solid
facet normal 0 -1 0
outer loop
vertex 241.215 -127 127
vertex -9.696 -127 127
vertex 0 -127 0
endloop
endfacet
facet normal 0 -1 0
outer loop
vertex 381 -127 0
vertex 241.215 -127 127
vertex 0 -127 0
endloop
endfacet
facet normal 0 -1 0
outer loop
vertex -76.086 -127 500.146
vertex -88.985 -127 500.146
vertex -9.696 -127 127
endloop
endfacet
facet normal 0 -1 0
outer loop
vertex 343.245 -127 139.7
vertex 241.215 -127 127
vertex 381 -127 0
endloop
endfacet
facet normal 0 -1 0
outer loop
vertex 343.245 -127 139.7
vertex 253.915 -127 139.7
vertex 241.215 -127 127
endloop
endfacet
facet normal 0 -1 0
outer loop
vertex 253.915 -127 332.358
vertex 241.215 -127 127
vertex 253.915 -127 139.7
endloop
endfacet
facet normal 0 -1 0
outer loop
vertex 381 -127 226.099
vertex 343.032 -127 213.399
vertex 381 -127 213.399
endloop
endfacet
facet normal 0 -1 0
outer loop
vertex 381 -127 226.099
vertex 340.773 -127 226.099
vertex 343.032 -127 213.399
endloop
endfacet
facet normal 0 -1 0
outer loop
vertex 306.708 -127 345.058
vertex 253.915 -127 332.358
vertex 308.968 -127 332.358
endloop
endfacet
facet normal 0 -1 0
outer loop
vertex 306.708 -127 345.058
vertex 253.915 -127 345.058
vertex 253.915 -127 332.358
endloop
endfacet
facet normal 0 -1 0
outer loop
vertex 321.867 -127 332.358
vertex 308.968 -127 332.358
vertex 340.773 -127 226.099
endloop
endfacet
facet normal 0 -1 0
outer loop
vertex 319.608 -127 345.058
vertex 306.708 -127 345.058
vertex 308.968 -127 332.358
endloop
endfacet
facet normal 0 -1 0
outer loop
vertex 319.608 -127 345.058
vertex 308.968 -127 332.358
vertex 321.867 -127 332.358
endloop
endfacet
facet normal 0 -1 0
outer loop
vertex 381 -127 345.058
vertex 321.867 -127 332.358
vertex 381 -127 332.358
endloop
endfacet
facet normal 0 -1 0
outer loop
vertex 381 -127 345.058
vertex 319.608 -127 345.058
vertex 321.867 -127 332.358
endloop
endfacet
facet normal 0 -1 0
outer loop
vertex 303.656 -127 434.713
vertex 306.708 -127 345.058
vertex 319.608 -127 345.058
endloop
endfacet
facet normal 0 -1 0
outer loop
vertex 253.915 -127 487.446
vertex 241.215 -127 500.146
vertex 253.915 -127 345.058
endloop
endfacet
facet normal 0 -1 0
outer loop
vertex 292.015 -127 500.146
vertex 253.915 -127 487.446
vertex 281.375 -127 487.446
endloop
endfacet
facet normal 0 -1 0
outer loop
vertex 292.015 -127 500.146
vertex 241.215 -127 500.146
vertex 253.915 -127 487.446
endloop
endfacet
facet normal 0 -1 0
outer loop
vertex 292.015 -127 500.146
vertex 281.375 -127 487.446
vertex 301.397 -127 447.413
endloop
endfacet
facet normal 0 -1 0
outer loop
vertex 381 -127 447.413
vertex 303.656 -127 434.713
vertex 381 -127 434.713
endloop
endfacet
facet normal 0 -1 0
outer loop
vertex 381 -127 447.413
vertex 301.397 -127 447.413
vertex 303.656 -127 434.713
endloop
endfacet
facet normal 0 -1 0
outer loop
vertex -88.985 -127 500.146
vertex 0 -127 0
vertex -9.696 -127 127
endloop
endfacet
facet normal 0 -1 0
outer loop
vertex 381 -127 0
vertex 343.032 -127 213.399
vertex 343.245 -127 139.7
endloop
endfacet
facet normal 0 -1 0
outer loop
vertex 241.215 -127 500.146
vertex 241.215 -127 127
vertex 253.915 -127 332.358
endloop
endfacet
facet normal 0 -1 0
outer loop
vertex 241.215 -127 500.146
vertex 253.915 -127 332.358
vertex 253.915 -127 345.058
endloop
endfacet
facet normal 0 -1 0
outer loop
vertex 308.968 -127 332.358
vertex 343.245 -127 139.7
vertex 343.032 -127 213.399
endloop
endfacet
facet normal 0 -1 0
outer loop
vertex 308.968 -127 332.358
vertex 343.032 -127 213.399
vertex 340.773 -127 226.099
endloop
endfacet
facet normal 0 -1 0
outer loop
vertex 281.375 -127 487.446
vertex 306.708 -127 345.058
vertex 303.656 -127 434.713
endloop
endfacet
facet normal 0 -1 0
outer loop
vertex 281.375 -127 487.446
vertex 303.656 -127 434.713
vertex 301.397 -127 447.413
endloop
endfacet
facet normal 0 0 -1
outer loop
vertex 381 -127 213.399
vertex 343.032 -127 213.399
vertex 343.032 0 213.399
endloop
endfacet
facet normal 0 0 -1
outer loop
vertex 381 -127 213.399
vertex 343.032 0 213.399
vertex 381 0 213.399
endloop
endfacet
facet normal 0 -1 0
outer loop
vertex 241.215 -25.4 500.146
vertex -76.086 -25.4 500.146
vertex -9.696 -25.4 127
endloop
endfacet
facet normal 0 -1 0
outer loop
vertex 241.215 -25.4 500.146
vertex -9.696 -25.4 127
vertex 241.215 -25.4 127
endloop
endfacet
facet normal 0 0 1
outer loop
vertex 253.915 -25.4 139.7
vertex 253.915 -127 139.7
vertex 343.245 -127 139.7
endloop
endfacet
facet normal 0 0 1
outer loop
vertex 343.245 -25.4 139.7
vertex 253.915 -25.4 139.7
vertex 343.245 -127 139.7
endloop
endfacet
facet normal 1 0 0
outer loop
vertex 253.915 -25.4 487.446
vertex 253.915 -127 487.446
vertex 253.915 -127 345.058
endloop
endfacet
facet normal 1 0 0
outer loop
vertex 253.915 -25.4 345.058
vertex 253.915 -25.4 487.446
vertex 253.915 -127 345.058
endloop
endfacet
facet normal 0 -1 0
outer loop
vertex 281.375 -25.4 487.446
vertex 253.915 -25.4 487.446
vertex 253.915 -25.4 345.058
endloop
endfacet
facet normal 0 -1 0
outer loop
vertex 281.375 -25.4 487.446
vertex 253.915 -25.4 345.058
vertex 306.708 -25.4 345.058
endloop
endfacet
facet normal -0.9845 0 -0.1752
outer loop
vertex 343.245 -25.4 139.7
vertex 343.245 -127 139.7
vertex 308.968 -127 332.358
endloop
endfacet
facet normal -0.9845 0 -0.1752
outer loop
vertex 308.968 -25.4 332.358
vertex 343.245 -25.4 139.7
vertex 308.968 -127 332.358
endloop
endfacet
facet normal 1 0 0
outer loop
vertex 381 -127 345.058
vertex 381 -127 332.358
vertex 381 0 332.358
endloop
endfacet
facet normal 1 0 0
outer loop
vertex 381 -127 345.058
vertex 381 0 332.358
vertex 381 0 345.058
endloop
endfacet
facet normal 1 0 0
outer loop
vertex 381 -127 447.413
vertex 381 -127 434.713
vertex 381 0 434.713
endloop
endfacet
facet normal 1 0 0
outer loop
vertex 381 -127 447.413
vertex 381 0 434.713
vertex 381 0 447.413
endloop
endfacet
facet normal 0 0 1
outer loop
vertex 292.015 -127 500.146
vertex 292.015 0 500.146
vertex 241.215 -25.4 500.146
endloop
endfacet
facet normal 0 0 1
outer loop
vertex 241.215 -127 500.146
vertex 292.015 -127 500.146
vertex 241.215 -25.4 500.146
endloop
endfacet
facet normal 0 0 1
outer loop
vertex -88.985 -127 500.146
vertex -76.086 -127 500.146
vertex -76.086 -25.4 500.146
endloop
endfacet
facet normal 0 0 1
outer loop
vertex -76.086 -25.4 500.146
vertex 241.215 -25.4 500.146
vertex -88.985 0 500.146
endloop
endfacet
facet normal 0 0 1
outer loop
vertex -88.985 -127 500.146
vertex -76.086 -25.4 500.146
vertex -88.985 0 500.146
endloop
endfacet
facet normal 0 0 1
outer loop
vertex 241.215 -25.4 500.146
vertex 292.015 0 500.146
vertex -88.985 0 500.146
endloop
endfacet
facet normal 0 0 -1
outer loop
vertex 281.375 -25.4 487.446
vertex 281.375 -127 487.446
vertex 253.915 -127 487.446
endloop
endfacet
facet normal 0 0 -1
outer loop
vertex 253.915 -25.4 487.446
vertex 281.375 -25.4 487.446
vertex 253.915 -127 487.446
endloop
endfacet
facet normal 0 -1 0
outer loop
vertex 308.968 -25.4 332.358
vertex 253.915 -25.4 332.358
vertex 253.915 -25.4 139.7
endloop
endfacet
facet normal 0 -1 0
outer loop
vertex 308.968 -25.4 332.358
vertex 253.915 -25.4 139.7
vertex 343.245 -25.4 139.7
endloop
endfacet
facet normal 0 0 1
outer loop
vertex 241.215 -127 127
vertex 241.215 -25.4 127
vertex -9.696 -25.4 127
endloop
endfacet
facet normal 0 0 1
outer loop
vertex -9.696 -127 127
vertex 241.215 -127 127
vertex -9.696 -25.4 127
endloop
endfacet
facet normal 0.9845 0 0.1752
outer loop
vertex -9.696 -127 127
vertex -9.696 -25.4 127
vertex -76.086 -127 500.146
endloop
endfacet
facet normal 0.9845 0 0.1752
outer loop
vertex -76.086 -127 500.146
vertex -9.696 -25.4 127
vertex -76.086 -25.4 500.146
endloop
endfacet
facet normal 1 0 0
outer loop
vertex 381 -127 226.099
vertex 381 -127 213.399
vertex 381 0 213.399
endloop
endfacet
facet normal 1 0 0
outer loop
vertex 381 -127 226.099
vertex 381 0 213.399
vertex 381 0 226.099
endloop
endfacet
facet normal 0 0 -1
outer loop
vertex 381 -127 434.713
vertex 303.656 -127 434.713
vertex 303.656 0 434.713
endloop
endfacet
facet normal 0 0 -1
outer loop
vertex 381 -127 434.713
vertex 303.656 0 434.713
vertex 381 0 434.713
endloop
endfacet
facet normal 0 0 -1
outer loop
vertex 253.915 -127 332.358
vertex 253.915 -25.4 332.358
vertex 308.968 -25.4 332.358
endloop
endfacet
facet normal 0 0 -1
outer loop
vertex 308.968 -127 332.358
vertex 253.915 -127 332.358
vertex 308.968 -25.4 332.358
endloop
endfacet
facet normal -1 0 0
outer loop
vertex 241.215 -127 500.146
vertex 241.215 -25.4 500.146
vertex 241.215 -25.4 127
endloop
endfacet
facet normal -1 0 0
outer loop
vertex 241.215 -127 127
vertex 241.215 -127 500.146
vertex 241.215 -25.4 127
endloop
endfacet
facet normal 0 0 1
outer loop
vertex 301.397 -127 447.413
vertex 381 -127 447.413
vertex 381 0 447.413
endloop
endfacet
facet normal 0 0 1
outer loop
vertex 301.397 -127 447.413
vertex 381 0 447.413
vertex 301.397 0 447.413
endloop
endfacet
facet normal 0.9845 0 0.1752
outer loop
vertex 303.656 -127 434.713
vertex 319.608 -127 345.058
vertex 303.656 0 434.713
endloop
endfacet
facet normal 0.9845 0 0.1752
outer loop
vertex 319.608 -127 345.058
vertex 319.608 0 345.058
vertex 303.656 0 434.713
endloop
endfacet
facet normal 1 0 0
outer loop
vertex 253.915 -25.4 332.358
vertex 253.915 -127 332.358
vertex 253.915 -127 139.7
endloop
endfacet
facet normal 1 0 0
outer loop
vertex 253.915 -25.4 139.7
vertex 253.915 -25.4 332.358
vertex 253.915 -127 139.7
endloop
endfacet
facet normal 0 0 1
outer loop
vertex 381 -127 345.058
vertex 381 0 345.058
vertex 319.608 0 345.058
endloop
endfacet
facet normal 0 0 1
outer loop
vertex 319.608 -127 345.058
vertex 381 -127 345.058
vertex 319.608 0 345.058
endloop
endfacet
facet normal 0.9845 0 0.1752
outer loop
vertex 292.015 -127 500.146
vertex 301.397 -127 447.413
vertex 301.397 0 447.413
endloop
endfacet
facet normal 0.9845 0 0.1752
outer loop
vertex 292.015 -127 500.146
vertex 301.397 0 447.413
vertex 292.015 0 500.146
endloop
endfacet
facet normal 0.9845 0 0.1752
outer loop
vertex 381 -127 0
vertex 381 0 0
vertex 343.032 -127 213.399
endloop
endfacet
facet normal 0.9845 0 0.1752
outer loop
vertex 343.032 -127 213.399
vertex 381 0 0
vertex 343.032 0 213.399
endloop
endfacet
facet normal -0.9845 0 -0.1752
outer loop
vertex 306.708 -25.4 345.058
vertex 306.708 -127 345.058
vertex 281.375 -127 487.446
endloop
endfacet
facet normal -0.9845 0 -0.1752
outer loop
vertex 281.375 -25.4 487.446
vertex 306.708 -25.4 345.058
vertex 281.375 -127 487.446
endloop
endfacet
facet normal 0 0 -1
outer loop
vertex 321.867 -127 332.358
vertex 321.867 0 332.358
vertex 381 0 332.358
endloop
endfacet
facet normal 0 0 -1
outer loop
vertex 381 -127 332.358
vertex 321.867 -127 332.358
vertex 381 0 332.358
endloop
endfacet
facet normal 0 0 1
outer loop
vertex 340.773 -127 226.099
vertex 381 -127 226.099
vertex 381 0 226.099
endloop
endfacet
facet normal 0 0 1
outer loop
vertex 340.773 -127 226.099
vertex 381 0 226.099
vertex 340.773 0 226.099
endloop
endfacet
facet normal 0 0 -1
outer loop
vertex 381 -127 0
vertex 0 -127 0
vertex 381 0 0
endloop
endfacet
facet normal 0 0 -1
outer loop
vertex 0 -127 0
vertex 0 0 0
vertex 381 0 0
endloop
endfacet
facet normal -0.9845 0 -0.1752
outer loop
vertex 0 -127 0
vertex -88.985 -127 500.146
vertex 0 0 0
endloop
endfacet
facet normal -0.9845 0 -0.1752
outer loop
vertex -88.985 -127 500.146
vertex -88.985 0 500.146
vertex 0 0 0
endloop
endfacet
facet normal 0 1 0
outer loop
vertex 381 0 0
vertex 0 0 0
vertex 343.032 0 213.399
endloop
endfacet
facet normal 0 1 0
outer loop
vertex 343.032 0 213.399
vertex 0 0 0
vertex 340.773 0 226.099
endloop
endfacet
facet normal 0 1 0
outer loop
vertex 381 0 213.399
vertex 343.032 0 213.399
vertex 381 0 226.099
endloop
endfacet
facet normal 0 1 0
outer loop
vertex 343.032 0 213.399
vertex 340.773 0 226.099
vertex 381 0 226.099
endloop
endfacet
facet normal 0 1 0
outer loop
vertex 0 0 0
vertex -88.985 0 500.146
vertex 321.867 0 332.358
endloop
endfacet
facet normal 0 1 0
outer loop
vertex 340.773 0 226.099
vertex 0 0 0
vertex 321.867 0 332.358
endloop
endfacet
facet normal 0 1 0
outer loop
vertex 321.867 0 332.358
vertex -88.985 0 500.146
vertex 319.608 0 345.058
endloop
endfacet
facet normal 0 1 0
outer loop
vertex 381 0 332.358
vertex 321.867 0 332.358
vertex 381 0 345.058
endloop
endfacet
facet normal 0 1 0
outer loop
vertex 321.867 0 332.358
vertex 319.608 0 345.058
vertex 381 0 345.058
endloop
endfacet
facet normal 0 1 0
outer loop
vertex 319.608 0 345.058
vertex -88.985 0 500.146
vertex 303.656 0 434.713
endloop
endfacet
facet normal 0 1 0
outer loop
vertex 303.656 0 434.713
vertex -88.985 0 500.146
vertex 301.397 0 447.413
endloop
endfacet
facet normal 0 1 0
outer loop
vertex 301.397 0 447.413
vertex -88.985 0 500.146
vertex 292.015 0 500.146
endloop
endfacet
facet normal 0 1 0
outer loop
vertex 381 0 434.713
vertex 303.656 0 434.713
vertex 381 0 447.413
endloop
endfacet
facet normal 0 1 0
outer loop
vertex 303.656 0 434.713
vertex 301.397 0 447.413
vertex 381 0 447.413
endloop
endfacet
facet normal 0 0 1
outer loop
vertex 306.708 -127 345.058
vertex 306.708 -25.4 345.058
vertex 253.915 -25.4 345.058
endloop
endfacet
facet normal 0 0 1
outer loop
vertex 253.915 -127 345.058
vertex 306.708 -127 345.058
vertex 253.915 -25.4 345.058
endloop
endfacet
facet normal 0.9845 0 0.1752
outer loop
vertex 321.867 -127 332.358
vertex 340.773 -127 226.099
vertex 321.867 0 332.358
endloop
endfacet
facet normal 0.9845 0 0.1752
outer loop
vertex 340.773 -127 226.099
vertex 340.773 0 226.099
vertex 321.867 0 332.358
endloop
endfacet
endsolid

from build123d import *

# Parameters (mm, degrees)
F1_DEPTH  = 25.4
F3_DEPTH  = 101.6
F5_DEPTH  = 101.6
F7_DEPTH  = 101.6
F9_DEPTH  = 127
F11_DEPTH = 101.6
F13_DEPTH = 101.6


with BuildPart() as f1:
    # F0 (on Front) → F1 (new body)
    with BuildSketch(Plane.XZ):
        Polygon((-88.9854516805, 500.1455681991), (0, 0), (381, 0), (292.0145483195, 500.1455681991), align=None)
    extrude(amount=F1_DEPTH)

    # F2 (on face) → F3 (join)
    with BuildSketch(Plane.XZ.offset(25.4)):
        Polygon((-22.5957262885, 127), (0, 0), (381, 0), (358.4042737115, 127), align=None)
    extrude(amount=F3_DEPTH)

    # F4 (on face) → F5 (join)
    with BuildSketch(Plane.XZ.offset(25.4)):
        Polygon((292.0145483195, 500.1455681991), (241.2145483195, 500.1455681991), (241.2145483195, 127), (358.4042737115, 127), align=None)
    extrude(amount=F5_DEPTH)

    # F6 (on face) → F7 (cut)
    with BuildSketch(Plane.XZ.offset(127)):
        Polygon((281.3746764461, 487.4455681991), (253.9145483195, 487.4455681991), (253.9145483195, 139.7), (343.2452565805, 139.7), align=None)
    extrude(amount=-F7_DEPTH, mode=Mode.SUBTRACT)

    # F8 (on face) → F9 (join)
    with BuildSketch(Plane.XZ.offset(127)):
        Polygon((301.3966677113, 447.4130670373), (303.6562403401, 434.7130670373), (381, 434.7130670373), (381, 447.4130670373), align=None)
        Polygon((319.6076049893, 345.0579134663), (321.8671776181, 332.3579134663), (381, 332.3579134663), (381, 345.0579134663), align=None)
        Polygon((343.0322212888, 213.3991107327), (381, 213.3991107327), (381, 226.0991107327), (340.77264866, 226.0991107327), align=None)
    extrude(amount=-F9_DEPTH)

    # F10 (on face) → F11 (join)
    with BuildSketch(Plane.XZ.offset(25.4)):
        Polygon((308.9677331159, 332.3579134663), (306.7081604871, 345.0579134663), (253.9145483195, 345.0579134663), (253.9145483195, 332.3579134663), align=None)
    extrude(amount=F11_DEPTH)

    # F12 (on face) → F13 (join)
    with BuildSketch(Plane.XZ.offset(25.4)):
        Polygon((-9.6962817863, 127), (-76.0860071783, 500.1455681991), (-88.9854516805, 500.1455681991), (-22.5957262885, 127), align=None)
    extrude(amount=F13_DEPTH)


solid = f1.part
